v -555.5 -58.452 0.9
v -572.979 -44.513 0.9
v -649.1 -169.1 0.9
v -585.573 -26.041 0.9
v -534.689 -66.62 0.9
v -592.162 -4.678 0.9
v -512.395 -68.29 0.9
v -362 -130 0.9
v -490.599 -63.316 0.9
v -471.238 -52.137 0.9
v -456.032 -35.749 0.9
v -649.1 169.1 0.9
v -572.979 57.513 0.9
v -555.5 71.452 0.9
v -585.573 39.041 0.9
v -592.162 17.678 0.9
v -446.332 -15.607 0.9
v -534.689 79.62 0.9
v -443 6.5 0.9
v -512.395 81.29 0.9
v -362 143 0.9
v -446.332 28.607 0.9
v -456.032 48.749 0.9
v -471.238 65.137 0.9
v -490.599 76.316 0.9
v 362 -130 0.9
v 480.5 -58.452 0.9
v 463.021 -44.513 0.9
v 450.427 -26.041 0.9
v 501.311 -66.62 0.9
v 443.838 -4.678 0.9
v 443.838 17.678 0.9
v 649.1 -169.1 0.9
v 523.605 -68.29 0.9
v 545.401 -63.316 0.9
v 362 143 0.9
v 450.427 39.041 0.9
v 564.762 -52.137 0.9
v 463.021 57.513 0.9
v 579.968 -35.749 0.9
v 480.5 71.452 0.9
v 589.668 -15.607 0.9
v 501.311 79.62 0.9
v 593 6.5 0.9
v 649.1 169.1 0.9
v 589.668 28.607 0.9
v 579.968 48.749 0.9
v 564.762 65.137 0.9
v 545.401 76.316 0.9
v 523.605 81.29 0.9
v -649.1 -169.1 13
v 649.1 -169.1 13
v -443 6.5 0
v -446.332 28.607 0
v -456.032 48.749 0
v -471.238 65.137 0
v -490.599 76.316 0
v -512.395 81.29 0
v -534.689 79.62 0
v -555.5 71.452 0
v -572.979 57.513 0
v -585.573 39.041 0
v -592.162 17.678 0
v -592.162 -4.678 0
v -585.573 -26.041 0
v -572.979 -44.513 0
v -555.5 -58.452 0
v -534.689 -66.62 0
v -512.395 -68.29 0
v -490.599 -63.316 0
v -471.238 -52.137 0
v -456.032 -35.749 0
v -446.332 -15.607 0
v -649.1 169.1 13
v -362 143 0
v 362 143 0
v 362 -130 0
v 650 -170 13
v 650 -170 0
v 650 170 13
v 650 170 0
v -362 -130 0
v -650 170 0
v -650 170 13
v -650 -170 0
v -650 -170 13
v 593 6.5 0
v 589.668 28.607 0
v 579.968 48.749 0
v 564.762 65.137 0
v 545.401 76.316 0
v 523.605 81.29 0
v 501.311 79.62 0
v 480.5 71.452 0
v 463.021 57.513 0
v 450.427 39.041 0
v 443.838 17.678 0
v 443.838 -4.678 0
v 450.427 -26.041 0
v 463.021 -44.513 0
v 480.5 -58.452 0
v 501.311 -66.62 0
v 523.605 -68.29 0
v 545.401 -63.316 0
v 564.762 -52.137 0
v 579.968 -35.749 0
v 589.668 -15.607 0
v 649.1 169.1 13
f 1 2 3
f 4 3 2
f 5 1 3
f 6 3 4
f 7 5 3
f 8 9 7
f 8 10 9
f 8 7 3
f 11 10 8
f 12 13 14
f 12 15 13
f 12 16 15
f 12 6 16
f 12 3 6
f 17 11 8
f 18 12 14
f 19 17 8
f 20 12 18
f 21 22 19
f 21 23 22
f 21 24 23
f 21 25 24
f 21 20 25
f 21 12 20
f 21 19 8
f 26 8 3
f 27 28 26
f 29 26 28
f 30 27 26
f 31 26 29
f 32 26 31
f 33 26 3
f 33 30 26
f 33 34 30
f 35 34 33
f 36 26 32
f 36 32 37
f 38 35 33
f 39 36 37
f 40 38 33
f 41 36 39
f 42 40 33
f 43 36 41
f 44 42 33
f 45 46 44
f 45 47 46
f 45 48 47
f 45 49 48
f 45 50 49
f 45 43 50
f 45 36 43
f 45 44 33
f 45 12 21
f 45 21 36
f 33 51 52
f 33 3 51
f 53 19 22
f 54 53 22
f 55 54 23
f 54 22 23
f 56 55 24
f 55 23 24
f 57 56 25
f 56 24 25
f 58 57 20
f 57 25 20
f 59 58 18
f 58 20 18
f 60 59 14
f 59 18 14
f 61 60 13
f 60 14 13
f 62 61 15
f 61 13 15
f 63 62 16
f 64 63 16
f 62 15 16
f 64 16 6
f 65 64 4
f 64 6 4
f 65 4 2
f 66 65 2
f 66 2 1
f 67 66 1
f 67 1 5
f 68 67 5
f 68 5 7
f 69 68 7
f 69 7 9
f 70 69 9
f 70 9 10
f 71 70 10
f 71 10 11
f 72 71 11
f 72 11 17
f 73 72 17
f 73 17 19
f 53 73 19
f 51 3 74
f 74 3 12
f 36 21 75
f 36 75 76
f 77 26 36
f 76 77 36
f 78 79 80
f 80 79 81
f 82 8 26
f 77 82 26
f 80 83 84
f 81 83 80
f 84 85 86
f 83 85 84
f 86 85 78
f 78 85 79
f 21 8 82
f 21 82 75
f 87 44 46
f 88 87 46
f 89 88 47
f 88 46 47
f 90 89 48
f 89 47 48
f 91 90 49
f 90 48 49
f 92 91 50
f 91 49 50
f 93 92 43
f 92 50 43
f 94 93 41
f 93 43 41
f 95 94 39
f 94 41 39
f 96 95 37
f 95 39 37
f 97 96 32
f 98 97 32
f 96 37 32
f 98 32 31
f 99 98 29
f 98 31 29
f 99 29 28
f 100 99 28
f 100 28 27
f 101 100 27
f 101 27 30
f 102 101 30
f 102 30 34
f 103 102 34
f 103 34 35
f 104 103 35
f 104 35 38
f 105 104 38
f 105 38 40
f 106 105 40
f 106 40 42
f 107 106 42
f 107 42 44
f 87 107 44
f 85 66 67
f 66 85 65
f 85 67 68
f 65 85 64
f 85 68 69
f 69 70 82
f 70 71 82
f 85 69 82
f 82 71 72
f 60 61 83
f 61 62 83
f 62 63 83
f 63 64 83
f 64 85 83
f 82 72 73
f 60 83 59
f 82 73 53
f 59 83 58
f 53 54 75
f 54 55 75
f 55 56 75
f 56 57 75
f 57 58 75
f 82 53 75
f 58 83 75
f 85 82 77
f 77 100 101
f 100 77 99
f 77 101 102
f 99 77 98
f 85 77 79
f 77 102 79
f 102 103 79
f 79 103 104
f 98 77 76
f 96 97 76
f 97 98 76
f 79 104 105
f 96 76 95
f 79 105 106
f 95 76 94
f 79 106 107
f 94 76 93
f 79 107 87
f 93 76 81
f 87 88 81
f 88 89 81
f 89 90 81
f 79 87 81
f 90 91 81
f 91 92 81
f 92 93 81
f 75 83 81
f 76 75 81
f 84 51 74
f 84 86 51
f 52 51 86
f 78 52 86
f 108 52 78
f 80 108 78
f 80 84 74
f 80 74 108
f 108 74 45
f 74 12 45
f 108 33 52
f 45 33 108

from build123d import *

# Parameters (mm, degrees)
F0_W          = 1300
F0_H          = 340
F1_DEPTH      = 13
F2_T          = -0.9
F3_W          = 724
F3_H          = 273
F4_DEPTH      = 0.901
F4_DEPTH_BACK = 12.101
F5_R          = 75
F6_DEPTH      = 12.101
F6_DEPTH_BACK = 0.901


with BuildPart() as f1:
    # F0 (on Top) → F1 (new body)
    with BuildSketch(Plane.XY):
        Rectangle(F0_W, F0_H)
    extrude(amount=F1_DEPTH)

    # F2
    f2_openings = [f1.faces().sort_by_distance(p)[0] for p in [
        (0, 0, 13),
    ]]
    offset(amount=F2_T, openings=f2_openings)

    # F3 (on face) → F4 (cut, two sides)
    with BuildSketch(Plane.XY.offset(0.9)) as f4_sk:
        with Locations((0, 6.5)):
            Rectangle(F3_W, F3_H)
    extrude(amount=-F4_DEPTH, mode=Mode.SUBTRACT)
    extrude(f4_sk.sketch, amount=-F4_DEPTH_BACK, mode=Mode.SUBTRACT)

    # F5 (on face) → F6 (cut, two sides)
    with BuildSketch(Plane.XY.offset(0.9)) as f6_sk:
        with Locations((-518, 6.5)):
            Circle(F5_R)
        with Locations((518, 6.5)):
            Circle(F5_R)
    extrude(amount=F6_DEPTH, mode=Mode.SUBTRACT)
    extrude(f6_sk.sketch, amount=-F6_DEPTH_BACK, mode=Mode.SUBTRACT)


solid = f1.part
